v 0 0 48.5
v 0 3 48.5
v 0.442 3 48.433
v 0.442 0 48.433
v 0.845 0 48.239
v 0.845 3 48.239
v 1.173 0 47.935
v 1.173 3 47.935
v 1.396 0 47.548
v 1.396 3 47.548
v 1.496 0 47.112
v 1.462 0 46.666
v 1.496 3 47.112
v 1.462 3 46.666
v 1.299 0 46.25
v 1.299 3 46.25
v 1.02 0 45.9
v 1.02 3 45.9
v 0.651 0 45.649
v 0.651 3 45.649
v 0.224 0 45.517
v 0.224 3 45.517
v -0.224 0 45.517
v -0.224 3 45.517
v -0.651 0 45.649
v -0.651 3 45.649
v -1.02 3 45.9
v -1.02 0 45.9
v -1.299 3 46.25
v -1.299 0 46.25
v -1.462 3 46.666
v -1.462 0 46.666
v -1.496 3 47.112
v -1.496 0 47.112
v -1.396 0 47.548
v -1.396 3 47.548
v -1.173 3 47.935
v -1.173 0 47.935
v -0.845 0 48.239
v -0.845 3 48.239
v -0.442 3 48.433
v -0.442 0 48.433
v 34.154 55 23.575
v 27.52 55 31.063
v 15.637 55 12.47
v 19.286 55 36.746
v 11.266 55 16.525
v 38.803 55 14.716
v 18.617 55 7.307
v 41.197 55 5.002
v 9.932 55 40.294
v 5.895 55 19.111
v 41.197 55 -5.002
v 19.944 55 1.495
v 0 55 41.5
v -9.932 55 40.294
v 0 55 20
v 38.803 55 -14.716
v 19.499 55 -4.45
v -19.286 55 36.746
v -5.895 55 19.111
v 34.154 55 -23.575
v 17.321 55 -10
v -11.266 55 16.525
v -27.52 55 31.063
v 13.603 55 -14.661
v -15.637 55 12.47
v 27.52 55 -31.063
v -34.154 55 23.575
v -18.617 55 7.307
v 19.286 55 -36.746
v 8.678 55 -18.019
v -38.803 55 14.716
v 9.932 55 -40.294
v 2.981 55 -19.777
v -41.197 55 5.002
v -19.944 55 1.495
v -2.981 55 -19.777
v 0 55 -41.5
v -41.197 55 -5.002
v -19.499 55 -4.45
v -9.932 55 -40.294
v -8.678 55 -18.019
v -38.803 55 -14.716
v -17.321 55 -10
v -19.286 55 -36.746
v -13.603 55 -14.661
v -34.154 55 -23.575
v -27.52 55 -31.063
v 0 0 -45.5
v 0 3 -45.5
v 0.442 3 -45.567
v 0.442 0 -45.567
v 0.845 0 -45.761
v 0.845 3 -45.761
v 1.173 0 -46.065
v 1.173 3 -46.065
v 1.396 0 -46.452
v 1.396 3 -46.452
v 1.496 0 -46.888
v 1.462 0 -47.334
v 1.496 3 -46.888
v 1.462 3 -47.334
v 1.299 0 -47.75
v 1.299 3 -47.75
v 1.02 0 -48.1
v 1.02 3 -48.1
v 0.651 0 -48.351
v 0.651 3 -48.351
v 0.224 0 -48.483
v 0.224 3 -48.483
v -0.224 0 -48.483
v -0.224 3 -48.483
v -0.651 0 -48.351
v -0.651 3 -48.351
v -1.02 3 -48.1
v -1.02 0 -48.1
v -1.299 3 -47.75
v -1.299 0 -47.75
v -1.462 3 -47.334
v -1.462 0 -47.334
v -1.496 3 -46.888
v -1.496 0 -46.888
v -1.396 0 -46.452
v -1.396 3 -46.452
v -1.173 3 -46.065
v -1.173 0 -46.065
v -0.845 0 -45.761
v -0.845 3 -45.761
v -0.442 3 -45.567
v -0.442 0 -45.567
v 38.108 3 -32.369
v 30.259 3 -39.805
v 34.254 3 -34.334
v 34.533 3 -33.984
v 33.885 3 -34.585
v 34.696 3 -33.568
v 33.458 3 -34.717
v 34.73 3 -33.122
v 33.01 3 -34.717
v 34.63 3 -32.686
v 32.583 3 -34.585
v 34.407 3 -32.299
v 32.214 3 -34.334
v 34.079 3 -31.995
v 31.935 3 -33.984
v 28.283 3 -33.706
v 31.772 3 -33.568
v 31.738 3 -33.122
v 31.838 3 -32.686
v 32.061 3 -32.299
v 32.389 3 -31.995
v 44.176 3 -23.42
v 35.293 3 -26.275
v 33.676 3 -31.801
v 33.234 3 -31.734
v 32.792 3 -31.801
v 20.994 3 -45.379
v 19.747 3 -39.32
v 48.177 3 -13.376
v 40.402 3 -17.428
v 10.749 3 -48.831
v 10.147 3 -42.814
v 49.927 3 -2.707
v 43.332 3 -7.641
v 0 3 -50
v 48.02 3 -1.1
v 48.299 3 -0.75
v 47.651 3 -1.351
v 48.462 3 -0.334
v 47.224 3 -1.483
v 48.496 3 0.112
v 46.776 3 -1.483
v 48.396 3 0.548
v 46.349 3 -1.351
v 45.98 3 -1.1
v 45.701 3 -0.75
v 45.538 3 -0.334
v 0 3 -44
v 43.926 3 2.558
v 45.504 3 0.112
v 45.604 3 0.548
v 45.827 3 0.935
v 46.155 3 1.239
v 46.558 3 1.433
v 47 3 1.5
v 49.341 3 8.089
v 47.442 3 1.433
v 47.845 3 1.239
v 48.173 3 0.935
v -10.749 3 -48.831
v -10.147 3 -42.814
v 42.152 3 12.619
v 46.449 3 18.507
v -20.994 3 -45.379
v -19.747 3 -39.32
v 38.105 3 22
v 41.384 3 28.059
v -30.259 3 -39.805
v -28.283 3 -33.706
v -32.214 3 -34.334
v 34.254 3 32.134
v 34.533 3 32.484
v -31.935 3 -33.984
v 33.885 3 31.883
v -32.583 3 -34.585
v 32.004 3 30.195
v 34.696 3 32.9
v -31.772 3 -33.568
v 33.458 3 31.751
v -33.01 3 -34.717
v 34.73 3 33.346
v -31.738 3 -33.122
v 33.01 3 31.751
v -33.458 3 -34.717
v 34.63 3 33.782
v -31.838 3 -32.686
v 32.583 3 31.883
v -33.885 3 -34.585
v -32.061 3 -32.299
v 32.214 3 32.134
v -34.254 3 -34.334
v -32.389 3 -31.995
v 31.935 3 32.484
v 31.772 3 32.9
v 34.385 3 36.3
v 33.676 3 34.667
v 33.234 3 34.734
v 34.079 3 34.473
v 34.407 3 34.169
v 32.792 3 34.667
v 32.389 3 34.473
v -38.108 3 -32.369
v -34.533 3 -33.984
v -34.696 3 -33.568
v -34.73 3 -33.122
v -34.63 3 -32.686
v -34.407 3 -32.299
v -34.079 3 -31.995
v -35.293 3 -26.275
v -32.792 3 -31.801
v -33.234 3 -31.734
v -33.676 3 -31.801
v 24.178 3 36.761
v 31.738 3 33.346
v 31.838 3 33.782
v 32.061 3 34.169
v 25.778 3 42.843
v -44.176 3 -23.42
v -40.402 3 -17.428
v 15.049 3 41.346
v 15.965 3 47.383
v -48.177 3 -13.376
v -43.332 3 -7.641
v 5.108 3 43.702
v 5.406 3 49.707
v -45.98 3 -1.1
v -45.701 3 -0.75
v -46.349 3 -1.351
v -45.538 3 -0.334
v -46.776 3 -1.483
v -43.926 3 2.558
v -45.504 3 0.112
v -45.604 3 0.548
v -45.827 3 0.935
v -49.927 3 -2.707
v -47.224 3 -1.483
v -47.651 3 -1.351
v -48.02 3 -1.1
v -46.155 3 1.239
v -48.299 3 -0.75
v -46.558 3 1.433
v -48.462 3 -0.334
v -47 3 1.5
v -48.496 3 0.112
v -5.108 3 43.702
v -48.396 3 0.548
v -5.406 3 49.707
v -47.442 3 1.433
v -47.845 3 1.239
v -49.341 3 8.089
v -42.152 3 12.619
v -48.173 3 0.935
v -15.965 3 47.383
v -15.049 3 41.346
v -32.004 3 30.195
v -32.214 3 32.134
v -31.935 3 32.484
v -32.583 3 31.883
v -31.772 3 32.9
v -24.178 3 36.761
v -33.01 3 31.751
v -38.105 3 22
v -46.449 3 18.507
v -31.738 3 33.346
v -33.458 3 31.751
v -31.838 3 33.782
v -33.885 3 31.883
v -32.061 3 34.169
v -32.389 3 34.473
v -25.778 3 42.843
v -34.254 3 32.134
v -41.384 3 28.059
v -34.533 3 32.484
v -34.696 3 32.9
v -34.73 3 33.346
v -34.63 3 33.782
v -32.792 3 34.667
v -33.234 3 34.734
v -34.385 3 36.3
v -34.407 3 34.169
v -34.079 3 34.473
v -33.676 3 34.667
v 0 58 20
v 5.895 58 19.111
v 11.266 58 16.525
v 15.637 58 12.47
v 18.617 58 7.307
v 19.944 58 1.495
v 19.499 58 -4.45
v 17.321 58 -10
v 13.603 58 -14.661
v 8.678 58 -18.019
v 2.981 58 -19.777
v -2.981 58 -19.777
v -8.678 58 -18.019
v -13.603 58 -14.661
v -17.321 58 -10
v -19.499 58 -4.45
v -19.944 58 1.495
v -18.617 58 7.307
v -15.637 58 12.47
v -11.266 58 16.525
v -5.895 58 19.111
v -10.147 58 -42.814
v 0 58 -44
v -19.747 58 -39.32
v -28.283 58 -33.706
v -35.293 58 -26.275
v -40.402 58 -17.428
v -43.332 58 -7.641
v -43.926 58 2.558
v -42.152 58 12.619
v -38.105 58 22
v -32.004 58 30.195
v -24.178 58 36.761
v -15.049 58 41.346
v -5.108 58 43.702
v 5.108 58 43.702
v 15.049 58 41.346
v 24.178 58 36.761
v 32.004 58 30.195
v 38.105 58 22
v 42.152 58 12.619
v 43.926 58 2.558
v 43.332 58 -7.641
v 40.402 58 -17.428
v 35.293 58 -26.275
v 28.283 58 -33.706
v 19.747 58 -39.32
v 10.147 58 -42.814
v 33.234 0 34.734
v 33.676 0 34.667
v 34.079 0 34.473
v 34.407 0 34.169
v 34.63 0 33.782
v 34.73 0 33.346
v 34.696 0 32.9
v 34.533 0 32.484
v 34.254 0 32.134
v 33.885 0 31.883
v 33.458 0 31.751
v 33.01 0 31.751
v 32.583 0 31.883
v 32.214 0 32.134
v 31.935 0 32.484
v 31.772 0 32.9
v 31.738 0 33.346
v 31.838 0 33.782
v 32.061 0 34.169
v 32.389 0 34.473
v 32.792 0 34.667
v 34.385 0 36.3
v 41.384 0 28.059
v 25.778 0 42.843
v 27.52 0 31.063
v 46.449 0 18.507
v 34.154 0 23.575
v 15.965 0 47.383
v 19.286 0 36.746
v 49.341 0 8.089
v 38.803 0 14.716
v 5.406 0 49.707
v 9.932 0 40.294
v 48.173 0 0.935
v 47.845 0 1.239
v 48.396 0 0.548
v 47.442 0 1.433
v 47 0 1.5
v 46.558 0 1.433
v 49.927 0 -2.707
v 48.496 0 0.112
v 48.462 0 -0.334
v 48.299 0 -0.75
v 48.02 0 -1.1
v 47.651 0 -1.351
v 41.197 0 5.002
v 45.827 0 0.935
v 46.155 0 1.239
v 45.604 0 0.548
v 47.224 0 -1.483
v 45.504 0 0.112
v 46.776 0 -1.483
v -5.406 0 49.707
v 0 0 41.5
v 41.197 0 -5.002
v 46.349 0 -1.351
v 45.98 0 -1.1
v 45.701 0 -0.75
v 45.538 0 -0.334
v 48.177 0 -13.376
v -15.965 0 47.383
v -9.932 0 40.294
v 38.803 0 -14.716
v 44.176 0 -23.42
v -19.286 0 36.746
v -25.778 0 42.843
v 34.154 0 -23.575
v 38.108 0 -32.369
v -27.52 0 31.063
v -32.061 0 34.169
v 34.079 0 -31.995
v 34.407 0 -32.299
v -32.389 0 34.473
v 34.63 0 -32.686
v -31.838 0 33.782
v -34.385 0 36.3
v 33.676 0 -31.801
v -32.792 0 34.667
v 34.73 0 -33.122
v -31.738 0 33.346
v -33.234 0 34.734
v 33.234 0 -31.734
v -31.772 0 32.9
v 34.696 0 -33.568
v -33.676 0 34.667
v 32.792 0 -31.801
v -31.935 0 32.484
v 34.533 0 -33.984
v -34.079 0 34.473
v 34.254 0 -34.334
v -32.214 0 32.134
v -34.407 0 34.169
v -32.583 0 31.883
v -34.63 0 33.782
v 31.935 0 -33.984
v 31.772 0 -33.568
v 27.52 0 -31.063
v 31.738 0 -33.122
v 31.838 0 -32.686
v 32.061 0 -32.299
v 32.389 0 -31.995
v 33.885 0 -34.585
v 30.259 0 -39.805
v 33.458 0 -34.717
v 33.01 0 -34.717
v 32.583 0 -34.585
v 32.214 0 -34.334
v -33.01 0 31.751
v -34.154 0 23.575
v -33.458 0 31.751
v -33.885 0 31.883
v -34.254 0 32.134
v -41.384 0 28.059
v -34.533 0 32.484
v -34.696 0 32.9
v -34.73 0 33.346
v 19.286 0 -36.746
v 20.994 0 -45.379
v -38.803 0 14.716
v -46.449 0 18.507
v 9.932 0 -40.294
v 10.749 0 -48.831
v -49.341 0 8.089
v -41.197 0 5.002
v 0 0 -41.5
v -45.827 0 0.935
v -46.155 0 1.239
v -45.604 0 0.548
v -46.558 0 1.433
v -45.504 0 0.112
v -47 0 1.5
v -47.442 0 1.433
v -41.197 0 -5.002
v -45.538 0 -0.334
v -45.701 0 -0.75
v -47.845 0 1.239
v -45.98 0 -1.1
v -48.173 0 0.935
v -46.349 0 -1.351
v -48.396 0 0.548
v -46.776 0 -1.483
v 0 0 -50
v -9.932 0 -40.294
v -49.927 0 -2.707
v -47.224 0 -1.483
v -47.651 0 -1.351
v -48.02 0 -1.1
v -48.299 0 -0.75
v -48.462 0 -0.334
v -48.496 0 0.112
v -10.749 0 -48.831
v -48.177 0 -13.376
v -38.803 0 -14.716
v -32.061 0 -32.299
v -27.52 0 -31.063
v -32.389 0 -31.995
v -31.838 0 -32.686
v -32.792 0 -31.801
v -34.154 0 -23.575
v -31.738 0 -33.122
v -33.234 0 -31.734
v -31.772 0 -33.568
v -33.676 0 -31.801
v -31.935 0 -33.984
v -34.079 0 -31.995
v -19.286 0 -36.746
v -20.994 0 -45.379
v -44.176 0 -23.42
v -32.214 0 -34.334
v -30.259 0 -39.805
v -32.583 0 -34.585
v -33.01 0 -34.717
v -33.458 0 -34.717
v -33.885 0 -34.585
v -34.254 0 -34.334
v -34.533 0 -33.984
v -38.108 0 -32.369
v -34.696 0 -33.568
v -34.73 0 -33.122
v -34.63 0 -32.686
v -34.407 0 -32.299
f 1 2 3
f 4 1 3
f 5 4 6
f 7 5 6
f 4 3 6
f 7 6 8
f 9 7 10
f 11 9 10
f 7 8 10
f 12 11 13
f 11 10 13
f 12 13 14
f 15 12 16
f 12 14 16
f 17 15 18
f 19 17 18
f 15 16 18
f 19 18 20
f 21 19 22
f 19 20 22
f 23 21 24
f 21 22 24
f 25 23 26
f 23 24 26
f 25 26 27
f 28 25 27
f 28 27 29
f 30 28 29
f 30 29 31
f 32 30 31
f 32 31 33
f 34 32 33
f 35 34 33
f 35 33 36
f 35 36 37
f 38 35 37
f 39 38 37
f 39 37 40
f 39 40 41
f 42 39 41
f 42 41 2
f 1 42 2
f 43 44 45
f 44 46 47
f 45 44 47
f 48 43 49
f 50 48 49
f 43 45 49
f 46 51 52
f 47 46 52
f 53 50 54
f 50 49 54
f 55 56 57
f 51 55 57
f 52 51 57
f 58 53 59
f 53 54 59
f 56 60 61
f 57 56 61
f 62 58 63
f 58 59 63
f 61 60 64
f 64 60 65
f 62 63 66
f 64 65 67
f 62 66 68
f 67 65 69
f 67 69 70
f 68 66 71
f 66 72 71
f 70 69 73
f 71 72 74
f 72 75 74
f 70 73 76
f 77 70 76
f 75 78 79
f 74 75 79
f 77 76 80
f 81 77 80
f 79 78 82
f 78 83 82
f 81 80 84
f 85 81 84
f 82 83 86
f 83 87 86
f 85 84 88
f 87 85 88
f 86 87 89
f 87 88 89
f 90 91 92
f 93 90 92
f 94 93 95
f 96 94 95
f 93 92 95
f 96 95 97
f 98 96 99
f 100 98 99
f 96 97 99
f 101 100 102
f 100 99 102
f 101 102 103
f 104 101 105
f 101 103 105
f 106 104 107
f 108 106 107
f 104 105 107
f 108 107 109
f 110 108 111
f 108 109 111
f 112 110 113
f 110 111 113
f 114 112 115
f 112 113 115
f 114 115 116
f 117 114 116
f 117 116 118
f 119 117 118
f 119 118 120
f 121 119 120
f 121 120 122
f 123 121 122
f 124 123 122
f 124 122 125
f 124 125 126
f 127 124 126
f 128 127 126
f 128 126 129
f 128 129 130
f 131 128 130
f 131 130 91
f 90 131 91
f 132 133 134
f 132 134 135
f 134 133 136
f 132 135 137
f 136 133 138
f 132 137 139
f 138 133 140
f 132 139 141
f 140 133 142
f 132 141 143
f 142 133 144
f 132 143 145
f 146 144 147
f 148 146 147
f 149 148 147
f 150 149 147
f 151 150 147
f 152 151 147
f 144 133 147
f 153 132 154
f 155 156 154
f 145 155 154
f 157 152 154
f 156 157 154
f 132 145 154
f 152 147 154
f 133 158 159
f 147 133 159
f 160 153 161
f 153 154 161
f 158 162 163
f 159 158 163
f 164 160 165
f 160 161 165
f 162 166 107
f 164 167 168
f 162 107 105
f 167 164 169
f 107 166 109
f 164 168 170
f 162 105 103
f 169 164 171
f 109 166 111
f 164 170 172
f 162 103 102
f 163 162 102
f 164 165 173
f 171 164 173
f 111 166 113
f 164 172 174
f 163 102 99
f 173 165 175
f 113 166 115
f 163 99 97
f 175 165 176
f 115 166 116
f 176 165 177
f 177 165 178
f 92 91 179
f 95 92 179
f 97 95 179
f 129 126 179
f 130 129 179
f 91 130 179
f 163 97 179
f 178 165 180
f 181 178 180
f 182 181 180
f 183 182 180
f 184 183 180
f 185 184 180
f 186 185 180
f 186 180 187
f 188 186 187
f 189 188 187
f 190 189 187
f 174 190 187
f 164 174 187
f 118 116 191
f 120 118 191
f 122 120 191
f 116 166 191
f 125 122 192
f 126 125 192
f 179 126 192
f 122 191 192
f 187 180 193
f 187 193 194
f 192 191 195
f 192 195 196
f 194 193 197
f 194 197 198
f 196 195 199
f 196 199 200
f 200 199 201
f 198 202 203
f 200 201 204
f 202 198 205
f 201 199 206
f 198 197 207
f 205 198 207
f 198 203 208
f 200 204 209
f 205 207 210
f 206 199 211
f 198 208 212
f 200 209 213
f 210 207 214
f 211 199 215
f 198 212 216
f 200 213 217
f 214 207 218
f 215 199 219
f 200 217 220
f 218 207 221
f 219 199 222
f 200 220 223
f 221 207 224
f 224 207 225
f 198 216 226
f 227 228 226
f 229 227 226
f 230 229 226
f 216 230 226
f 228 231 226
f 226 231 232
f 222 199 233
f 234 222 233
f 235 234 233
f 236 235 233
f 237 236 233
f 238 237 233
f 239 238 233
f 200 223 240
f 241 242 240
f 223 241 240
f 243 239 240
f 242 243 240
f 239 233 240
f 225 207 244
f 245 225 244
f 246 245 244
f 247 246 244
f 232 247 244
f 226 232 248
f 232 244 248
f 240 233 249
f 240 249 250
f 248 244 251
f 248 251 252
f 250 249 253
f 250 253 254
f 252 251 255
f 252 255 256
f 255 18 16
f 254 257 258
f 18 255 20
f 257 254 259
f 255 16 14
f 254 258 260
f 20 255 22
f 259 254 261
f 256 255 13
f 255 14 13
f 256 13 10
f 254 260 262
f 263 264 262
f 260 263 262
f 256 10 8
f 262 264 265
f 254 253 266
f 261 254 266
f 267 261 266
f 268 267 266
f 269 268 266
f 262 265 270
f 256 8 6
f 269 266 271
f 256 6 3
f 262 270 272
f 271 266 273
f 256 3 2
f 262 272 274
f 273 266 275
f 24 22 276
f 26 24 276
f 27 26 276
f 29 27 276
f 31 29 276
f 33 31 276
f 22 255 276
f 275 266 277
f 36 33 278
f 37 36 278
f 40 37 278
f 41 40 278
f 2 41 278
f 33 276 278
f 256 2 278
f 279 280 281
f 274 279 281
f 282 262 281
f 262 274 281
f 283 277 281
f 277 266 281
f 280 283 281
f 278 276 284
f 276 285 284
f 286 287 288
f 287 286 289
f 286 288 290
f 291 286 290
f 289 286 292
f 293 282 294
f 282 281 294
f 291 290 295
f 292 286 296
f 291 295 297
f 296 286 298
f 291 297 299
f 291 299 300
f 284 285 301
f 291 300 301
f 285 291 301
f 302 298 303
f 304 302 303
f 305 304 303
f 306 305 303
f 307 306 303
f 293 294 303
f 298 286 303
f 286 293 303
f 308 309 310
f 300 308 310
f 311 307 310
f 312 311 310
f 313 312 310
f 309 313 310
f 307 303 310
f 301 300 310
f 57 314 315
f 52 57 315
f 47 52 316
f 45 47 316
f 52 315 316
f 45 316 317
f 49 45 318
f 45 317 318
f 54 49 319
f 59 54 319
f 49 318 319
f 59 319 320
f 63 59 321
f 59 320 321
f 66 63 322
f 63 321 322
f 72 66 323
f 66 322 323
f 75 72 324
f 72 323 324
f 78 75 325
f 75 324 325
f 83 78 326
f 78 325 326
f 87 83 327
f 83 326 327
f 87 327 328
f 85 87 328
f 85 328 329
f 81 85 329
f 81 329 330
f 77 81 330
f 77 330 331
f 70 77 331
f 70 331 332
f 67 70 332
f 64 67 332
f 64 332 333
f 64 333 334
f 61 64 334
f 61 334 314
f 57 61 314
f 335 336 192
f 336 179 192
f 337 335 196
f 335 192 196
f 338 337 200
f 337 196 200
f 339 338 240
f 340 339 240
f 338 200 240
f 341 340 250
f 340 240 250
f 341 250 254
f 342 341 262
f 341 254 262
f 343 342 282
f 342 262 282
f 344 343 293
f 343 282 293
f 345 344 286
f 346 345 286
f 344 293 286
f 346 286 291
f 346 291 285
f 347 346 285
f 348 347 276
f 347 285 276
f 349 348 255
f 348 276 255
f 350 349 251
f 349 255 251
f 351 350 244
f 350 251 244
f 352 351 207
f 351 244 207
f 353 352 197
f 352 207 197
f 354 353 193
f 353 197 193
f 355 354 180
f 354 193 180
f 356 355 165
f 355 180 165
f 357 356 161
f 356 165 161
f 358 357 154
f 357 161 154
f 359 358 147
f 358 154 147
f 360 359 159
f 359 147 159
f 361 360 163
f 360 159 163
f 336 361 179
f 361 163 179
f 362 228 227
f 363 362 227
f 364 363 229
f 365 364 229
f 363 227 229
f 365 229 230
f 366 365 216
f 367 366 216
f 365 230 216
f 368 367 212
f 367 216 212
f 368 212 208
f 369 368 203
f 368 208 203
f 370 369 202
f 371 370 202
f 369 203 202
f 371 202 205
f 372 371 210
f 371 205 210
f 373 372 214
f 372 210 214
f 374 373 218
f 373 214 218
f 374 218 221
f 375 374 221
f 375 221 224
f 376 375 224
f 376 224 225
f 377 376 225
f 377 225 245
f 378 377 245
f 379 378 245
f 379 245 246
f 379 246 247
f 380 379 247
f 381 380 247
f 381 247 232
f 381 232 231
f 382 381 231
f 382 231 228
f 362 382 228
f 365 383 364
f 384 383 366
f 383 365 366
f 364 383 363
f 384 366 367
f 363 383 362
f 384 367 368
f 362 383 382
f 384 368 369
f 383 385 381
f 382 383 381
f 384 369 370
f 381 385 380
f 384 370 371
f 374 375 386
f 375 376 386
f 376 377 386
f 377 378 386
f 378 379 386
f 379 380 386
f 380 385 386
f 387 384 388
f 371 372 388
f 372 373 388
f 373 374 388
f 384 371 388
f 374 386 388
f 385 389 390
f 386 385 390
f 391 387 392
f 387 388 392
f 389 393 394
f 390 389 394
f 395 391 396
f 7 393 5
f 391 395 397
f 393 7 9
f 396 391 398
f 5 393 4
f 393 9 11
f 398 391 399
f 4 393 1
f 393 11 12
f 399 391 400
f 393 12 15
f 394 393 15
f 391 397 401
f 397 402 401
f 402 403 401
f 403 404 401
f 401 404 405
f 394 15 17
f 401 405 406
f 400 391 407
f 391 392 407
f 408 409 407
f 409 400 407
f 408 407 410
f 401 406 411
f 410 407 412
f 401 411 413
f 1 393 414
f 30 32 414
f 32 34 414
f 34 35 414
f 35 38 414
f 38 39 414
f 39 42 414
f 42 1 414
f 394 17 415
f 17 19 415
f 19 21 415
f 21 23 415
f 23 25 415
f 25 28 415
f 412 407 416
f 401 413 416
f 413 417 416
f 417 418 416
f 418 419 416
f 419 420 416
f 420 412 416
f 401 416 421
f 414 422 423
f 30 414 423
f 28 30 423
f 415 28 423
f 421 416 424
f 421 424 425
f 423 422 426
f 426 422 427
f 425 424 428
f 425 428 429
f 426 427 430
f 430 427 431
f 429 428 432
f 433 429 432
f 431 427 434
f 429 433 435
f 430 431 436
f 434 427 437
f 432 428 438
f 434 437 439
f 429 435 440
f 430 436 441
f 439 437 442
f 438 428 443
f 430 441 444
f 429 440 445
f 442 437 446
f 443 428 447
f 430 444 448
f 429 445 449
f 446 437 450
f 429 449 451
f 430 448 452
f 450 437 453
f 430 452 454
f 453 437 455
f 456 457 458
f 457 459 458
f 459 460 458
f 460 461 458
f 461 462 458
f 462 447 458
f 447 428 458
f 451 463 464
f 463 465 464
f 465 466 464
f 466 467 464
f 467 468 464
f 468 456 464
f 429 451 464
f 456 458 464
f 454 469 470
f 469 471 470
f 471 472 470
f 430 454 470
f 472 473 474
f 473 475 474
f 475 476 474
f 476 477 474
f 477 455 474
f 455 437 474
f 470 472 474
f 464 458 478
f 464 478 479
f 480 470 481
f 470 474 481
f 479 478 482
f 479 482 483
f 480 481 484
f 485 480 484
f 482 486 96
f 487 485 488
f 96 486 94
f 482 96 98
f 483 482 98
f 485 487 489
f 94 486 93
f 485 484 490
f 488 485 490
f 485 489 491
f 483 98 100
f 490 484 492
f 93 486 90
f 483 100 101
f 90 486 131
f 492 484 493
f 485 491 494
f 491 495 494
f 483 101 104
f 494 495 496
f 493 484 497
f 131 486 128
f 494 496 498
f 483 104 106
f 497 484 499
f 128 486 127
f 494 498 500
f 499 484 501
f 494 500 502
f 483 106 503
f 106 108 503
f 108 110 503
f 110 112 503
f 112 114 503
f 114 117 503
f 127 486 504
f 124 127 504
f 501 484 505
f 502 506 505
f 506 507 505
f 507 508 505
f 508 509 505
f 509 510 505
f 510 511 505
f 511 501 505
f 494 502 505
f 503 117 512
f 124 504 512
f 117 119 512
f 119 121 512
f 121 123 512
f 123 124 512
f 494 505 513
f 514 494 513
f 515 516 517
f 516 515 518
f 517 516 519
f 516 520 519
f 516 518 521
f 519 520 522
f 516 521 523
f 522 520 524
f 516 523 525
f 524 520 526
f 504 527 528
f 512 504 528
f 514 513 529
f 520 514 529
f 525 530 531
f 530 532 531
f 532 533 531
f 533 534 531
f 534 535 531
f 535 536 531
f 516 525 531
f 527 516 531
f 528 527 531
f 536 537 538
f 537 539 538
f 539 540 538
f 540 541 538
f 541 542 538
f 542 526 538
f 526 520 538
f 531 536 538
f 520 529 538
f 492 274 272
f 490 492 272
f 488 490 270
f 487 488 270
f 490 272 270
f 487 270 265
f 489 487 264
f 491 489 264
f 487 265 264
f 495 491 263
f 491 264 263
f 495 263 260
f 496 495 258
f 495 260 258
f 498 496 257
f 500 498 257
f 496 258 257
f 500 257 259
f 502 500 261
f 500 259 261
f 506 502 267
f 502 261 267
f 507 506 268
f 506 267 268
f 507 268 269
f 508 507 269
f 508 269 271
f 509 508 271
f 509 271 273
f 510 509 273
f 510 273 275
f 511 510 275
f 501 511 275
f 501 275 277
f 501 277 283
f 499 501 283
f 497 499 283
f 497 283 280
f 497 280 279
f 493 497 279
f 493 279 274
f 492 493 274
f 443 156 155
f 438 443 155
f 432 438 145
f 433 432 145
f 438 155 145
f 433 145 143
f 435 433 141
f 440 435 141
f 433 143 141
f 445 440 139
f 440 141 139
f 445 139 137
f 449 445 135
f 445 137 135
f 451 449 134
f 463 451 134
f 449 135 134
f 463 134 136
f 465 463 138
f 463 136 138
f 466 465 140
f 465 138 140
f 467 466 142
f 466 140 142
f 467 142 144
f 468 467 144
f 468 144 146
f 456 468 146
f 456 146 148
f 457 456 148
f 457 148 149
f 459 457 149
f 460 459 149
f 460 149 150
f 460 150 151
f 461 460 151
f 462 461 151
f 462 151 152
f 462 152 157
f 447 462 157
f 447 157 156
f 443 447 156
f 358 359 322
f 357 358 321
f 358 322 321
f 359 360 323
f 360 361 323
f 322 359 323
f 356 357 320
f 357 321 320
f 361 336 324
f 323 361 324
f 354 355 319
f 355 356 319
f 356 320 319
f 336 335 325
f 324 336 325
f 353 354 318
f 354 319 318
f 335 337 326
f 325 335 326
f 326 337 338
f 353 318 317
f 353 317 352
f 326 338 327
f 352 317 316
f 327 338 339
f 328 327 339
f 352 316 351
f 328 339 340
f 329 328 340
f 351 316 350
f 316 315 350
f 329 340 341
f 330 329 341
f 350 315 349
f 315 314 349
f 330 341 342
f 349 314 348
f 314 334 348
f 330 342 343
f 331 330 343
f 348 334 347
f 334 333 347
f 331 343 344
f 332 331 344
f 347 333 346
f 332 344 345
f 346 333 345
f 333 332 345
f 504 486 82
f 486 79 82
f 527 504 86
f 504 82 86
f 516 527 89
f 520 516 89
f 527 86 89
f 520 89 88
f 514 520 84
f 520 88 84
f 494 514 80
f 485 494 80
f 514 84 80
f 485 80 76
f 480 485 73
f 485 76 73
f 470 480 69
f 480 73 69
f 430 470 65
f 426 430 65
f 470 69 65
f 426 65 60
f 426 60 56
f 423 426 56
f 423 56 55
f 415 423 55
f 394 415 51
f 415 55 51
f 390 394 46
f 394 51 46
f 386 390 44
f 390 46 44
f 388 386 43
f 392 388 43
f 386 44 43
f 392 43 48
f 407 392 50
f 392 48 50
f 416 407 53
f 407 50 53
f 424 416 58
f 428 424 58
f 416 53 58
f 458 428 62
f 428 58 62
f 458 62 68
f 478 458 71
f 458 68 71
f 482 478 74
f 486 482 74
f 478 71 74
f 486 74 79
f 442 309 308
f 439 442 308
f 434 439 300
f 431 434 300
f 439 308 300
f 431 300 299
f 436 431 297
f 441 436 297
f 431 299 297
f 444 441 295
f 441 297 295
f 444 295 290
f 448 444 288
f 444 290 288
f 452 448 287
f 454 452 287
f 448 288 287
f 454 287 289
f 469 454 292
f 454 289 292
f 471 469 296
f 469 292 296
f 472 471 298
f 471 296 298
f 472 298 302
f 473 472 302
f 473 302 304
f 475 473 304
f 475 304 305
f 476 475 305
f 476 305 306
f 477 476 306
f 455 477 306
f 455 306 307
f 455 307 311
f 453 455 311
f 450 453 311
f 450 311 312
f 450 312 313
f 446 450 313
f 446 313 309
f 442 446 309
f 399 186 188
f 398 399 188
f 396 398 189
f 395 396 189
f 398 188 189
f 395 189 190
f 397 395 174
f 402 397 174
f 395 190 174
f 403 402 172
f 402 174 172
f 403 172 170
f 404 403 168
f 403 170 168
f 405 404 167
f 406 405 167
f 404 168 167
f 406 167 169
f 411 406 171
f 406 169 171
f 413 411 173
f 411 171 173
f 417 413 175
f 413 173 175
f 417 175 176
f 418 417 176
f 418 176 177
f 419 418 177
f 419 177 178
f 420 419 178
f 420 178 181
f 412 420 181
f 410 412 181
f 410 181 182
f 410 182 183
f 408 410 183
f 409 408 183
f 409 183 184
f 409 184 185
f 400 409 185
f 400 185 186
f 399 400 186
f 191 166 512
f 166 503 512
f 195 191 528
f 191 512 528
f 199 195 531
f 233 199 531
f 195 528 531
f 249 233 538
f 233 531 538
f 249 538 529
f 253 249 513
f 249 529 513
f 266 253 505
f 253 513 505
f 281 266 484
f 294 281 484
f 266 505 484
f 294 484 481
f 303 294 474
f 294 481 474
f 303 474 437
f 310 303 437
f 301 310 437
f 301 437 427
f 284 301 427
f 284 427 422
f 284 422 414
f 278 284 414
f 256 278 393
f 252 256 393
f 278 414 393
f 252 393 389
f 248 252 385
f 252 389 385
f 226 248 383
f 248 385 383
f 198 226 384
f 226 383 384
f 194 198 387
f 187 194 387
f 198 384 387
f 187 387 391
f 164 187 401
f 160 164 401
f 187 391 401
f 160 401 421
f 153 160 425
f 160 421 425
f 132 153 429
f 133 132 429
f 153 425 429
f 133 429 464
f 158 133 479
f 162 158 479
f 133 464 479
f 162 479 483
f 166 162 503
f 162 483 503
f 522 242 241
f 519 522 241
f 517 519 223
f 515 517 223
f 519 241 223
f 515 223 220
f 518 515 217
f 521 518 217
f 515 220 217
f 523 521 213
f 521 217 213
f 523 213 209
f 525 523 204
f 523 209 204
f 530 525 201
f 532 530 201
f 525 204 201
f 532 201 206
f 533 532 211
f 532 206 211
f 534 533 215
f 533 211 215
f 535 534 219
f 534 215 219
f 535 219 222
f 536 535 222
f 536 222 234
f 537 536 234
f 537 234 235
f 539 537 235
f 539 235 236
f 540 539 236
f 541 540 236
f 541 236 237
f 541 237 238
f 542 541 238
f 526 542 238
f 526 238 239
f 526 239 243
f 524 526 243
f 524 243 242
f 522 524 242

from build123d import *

# Parameters (mm, degrees)
SKETCH2_R          = 1.5
CUT_EXTRUDE1_DEPTH = 90.582364336
SKETCH3_R          = 20
CUT_EXTRUDE2_DEPTH = 92.454906921


with BuildPart() as part:
    # Sketch1 → Revolve1 (revolve)
    with BuildSketch(Plane.XY, mode=Mode.PRIVATE) as revolve1_sk:
        Polygon((0, 58), (44, 58), (44, 3), (50, 3), (50, 0), (41.5, 0), (41.5, 55), (0, 55), align=None)
    revolve(revolve1_sk.sketch.rotate(Axis((0, 0, 0), (0, 1, 0)), 90), axis=Axis((0, 0, 0), (0, 1, 0)))

    # Sketch2 → Cut-Extrude1 (cut, through all)
    with BuildSketch(Plane(origin=(0, 3, 0), x_dir=(1, 0, 0), z_dir=(0, 1, 0))):
        with Locations(Location((0, -47, 0), (0, 0, 270))):
            Circle(SKETCH2_R)
        with Locations(Location((-33.234018716, -33.234018716, 0), (0, 0, 270))):
            Circle(SKETCH2_R)
        with Locations(Location((-47, 0, 0), (0, 0, 270))):
            Circle(SKETCH2_R)
        with Locations(Location((-33.234018716, 33.234018716, 0), (0, 0, 270))):
            Circle(SKETCH2_R)
        with Locations(Location((0, 47, 0), (0, 0, 270))):
            Circle(SKETCH2_R)
        with Locations(Location((33.234018716, 33.234018716, 0), (0, 0, 270))):
            Circle(SKETCH2_R)
        with Locations(Location((47, 0, 0), (0, 0, 270))):
            Circle(SKETCH2_R)
        with Locations(Location((33.234018716, -33.234018716, 0), (0, 0, 270))):
            Circle(SKETCH2_R)
    extrude(amount=-CUT_EXTRUDE1_DEPTH, mode=Mode.SUBTRACT)

    # Sketch3 → Cut-Extrude2 (cut, through all)
    with BuildSketch(Plane(origin=(0, 58, 0), x_dir=(1, 0, 0), z_dir=(0, 1, 0))):
        with Locations(Location((0, 0, 0), (0, 0, 270))):
            Circle(SKETCH3_R)
    extrude(amount=-CUT_EXTRUDE2_DEPTH, mode=Mode.SUBTRACT)


solid = part.part
